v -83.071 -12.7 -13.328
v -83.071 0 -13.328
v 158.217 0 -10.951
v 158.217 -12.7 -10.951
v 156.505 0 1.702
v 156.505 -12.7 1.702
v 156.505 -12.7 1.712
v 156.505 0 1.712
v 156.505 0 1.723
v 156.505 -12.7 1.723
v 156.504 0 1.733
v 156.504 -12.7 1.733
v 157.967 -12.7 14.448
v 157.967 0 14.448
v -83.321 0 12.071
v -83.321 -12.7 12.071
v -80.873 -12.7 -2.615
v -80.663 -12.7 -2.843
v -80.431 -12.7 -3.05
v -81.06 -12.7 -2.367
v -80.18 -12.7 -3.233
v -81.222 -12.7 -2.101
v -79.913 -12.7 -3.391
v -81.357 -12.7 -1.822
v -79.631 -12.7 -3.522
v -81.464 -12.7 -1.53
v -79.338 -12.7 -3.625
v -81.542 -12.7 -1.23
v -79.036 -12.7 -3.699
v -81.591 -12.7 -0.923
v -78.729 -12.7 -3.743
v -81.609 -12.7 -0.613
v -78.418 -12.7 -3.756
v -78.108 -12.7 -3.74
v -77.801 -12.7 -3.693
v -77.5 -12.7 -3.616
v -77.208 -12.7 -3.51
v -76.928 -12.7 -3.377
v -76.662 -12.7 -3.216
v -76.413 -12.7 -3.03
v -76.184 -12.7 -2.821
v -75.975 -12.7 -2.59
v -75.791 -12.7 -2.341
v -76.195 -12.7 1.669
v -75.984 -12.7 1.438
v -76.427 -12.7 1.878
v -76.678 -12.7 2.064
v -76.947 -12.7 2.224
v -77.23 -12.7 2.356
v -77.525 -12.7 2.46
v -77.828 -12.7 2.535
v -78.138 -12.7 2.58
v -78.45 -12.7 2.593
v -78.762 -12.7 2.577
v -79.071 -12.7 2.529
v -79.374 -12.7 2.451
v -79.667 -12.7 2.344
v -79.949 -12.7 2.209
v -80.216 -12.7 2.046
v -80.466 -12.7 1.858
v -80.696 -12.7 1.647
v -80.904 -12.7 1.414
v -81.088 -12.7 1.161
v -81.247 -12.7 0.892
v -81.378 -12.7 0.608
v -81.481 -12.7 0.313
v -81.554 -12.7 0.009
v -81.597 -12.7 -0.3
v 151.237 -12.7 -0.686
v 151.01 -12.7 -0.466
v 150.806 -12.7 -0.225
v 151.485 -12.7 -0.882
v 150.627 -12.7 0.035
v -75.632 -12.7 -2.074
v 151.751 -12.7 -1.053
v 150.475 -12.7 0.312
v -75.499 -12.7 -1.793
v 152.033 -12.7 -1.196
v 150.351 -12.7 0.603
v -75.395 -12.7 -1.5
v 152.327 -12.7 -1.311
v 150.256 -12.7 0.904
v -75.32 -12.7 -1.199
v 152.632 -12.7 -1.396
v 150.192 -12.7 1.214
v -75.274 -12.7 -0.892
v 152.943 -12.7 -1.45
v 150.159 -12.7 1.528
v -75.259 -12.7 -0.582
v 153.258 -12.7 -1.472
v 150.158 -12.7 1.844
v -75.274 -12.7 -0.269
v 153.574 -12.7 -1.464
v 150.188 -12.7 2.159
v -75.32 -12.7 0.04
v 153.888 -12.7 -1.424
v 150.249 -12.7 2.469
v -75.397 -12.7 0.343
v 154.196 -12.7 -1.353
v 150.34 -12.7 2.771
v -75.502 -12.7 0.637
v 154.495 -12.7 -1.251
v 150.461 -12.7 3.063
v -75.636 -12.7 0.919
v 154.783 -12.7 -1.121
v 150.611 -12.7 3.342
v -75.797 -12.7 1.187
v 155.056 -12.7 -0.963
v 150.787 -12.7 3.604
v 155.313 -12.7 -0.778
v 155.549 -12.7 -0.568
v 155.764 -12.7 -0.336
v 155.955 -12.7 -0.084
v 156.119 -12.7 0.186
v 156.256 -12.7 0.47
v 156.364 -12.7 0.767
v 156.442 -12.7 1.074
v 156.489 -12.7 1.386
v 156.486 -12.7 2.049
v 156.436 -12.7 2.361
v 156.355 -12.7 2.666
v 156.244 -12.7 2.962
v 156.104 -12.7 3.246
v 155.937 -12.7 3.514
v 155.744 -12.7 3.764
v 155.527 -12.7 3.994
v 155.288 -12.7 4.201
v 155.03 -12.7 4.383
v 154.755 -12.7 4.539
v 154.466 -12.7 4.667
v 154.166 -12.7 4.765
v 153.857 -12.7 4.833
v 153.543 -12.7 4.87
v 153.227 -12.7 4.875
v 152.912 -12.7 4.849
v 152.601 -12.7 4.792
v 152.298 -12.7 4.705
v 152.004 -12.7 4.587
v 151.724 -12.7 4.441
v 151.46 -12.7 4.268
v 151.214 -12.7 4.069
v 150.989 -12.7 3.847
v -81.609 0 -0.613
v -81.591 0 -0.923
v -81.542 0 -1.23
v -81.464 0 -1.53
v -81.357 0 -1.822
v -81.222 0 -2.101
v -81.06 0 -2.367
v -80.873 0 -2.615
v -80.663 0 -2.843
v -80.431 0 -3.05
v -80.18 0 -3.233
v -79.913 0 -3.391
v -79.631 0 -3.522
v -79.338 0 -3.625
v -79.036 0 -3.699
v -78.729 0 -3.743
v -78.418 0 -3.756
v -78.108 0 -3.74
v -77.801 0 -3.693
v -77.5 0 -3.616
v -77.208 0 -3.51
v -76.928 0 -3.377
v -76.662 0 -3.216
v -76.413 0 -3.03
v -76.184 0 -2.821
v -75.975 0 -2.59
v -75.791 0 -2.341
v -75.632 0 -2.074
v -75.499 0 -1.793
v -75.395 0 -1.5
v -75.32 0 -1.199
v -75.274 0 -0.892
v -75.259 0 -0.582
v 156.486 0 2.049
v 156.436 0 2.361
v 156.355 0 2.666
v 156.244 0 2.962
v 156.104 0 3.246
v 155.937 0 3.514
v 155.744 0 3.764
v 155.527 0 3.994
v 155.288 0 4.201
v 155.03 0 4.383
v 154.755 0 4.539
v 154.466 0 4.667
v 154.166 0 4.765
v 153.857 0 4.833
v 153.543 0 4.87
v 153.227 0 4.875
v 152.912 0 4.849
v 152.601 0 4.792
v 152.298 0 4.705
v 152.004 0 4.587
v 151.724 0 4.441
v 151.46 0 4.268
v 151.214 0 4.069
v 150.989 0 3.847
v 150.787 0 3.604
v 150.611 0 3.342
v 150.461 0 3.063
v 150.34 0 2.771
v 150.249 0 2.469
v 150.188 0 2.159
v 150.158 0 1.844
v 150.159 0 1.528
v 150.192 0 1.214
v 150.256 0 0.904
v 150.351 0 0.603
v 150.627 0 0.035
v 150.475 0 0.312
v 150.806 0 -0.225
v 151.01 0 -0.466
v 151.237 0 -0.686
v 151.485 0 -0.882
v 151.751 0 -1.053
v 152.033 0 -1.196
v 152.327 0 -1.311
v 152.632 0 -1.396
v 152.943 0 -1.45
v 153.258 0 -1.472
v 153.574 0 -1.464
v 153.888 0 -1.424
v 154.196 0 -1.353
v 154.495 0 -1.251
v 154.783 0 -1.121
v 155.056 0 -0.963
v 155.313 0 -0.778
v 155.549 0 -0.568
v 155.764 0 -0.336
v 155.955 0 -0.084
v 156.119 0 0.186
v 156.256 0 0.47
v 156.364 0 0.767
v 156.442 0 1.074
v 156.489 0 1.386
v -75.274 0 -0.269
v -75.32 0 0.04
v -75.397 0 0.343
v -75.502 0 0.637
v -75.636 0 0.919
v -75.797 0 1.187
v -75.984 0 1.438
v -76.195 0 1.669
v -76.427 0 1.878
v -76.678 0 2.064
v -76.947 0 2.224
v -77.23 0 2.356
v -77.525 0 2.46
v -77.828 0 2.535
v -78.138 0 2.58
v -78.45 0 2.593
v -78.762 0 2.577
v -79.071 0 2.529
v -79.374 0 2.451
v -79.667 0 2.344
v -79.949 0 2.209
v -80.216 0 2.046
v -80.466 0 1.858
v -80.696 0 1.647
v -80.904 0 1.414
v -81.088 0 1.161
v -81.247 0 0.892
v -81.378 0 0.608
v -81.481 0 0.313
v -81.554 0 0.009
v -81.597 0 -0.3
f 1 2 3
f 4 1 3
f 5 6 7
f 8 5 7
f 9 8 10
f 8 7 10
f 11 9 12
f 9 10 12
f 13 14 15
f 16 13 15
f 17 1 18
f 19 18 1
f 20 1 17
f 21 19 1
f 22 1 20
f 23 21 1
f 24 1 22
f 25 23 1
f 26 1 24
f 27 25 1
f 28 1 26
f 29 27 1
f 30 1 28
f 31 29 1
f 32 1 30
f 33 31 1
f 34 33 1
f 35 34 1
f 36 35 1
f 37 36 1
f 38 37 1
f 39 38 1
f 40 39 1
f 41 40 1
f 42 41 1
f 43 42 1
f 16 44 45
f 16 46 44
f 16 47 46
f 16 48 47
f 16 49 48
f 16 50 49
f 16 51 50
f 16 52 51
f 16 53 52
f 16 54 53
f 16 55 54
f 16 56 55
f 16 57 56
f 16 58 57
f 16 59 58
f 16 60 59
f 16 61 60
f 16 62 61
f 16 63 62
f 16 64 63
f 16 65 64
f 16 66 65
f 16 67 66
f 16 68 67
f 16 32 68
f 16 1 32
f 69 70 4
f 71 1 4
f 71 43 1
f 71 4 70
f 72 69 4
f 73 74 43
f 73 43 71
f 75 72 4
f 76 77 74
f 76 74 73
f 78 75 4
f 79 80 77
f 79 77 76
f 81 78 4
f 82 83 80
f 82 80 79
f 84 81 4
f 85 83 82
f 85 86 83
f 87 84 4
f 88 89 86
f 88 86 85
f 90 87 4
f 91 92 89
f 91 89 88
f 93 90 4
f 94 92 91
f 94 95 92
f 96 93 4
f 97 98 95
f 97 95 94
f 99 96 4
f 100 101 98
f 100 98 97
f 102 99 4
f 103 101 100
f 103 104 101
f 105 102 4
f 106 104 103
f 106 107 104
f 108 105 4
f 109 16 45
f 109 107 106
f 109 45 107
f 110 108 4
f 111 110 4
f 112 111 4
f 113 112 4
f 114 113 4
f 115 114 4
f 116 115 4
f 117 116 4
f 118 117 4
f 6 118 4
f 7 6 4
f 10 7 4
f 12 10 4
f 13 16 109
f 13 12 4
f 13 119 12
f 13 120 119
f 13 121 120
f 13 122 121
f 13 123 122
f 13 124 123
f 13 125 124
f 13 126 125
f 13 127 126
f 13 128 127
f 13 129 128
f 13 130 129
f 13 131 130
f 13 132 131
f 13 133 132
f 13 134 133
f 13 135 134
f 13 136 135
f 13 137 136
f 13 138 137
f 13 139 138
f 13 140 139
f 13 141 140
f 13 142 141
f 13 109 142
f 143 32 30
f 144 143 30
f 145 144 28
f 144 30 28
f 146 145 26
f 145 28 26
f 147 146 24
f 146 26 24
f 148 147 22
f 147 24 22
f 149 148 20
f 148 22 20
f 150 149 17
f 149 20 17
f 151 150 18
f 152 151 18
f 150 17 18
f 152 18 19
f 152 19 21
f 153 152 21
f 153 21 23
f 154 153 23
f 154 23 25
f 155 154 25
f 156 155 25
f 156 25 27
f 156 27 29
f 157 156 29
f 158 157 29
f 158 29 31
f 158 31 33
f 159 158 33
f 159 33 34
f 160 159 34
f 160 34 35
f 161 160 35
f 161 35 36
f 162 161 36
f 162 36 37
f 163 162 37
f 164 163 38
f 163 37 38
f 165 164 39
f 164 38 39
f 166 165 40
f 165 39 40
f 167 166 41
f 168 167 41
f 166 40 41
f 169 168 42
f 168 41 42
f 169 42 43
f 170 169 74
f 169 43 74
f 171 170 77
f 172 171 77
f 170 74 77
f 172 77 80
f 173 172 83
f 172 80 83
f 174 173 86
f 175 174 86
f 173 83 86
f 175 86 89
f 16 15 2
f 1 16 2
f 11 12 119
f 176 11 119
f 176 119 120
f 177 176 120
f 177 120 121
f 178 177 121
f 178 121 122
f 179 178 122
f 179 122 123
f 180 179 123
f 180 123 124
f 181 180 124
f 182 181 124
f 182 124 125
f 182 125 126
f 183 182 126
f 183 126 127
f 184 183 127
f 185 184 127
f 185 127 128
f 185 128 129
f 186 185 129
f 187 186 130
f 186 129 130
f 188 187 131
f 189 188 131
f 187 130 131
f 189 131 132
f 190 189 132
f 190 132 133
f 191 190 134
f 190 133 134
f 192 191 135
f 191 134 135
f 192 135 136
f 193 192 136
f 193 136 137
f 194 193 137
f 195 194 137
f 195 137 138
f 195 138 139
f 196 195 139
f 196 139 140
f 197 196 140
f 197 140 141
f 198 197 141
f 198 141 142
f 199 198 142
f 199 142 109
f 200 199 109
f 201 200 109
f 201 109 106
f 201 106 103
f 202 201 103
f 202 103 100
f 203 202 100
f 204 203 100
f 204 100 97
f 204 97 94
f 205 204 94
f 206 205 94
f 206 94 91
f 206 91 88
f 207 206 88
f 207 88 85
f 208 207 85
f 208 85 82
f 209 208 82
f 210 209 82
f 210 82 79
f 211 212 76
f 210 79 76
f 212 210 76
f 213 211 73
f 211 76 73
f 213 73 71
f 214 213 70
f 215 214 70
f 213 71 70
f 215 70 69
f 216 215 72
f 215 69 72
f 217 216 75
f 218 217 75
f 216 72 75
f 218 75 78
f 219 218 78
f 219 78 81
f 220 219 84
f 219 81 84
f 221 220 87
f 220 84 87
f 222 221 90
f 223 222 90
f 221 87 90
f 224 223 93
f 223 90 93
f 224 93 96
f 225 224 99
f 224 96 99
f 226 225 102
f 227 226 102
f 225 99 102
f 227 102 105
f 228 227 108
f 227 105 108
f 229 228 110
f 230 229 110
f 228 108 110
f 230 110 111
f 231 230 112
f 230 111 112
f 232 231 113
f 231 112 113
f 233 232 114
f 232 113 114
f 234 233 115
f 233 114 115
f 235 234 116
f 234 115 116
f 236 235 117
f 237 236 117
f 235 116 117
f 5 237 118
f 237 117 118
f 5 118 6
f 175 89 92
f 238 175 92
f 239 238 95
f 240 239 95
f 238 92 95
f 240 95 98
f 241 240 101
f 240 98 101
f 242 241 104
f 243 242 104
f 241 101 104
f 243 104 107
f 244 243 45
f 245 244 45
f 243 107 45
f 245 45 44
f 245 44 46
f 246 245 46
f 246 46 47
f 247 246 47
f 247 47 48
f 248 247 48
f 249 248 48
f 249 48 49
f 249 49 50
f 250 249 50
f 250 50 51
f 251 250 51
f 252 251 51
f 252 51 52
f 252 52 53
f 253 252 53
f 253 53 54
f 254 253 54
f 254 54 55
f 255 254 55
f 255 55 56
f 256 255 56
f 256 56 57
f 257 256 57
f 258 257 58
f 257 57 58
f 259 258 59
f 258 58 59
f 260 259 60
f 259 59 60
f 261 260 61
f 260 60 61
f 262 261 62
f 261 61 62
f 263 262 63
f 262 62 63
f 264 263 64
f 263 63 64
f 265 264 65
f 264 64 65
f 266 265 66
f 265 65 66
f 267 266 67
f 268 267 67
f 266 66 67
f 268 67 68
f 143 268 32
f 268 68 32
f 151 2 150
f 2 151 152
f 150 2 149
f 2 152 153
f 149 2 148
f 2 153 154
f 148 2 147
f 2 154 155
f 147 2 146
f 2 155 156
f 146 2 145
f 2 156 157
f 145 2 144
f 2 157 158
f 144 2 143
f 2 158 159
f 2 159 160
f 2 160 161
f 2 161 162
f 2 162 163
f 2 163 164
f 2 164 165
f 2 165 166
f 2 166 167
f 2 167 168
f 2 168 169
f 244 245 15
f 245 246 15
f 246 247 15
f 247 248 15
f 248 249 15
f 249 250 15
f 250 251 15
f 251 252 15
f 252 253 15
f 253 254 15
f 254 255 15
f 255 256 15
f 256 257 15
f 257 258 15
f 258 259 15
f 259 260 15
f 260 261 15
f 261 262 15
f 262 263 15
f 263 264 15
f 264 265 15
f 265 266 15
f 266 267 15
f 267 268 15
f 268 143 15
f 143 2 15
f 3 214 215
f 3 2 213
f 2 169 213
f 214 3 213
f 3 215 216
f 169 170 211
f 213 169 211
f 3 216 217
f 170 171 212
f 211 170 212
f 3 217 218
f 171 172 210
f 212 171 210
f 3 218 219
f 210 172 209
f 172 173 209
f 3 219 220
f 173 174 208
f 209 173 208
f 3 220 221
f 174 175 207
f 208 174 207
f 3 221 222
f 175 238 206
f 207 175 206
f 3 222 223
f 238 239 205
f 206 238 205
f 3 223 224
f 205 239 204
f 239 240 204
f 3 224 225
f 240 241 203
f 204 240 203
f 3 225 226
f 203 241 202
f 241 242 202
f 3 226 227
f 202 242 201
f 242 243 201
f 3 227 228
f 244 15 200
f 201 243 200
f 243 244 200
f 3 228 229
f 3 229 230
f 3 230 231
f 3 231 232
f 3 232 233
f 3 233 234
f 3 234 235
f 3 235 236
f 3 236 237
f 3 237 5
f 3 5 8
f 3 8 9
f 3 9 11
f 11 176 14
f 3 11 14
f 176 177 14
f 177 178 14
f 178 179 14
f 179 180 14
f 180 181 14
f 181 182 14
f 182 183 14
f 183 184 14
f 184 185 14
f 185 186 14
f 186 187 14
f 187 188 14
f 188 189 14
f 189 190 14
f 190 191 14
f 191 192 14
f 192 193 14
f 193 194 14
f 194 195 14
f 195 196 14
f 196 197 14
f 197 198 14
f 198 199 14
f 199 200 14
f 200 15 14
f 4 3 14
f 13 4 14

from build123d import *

# Parameters (mm, degrees)
F1_DEPTH = 12.7
F3_DEPTH = 12.701


with BuildPart() as f1:
    # F0 (on Front) → F1 (new body)
    with BuildSketch(Plane.XZ):
        Polygon((157.966793, 14.448158), (-83.321497, 12.070934), (-83.071263, -13.327833), (158.217027, -10.950609), align=None)
    extrude(amount=F1_DEPTH)

    # F2 (on face) → F3 (cut, through all)
    with BuildSketch(Plane.XZ.offset(12.7)):
        with BuildLine():
            ThreePointArc((-81.608957, -0.61281), (-78.418471, -3.756492), (-75.259111, -0.58153))
            ThreePointArc((-75.259111, -0.58153), (-78.449751, 2.593431), (-81.608957, -0.61281))
        make_face()
        with BuildLine():
            ThreePointArc((156.504487, 1.733135), (150.15468, 1.686216), (156.504641, 1.701856))
            ThreePointArc((156.504641, 1.701856), (156.504603, 1.717496), (156.504487, 1.733135))
        make_face()
    extrude(amount=-F3_DEPTH, mode=Mode.SUBTRACT)


solid = f1.part
